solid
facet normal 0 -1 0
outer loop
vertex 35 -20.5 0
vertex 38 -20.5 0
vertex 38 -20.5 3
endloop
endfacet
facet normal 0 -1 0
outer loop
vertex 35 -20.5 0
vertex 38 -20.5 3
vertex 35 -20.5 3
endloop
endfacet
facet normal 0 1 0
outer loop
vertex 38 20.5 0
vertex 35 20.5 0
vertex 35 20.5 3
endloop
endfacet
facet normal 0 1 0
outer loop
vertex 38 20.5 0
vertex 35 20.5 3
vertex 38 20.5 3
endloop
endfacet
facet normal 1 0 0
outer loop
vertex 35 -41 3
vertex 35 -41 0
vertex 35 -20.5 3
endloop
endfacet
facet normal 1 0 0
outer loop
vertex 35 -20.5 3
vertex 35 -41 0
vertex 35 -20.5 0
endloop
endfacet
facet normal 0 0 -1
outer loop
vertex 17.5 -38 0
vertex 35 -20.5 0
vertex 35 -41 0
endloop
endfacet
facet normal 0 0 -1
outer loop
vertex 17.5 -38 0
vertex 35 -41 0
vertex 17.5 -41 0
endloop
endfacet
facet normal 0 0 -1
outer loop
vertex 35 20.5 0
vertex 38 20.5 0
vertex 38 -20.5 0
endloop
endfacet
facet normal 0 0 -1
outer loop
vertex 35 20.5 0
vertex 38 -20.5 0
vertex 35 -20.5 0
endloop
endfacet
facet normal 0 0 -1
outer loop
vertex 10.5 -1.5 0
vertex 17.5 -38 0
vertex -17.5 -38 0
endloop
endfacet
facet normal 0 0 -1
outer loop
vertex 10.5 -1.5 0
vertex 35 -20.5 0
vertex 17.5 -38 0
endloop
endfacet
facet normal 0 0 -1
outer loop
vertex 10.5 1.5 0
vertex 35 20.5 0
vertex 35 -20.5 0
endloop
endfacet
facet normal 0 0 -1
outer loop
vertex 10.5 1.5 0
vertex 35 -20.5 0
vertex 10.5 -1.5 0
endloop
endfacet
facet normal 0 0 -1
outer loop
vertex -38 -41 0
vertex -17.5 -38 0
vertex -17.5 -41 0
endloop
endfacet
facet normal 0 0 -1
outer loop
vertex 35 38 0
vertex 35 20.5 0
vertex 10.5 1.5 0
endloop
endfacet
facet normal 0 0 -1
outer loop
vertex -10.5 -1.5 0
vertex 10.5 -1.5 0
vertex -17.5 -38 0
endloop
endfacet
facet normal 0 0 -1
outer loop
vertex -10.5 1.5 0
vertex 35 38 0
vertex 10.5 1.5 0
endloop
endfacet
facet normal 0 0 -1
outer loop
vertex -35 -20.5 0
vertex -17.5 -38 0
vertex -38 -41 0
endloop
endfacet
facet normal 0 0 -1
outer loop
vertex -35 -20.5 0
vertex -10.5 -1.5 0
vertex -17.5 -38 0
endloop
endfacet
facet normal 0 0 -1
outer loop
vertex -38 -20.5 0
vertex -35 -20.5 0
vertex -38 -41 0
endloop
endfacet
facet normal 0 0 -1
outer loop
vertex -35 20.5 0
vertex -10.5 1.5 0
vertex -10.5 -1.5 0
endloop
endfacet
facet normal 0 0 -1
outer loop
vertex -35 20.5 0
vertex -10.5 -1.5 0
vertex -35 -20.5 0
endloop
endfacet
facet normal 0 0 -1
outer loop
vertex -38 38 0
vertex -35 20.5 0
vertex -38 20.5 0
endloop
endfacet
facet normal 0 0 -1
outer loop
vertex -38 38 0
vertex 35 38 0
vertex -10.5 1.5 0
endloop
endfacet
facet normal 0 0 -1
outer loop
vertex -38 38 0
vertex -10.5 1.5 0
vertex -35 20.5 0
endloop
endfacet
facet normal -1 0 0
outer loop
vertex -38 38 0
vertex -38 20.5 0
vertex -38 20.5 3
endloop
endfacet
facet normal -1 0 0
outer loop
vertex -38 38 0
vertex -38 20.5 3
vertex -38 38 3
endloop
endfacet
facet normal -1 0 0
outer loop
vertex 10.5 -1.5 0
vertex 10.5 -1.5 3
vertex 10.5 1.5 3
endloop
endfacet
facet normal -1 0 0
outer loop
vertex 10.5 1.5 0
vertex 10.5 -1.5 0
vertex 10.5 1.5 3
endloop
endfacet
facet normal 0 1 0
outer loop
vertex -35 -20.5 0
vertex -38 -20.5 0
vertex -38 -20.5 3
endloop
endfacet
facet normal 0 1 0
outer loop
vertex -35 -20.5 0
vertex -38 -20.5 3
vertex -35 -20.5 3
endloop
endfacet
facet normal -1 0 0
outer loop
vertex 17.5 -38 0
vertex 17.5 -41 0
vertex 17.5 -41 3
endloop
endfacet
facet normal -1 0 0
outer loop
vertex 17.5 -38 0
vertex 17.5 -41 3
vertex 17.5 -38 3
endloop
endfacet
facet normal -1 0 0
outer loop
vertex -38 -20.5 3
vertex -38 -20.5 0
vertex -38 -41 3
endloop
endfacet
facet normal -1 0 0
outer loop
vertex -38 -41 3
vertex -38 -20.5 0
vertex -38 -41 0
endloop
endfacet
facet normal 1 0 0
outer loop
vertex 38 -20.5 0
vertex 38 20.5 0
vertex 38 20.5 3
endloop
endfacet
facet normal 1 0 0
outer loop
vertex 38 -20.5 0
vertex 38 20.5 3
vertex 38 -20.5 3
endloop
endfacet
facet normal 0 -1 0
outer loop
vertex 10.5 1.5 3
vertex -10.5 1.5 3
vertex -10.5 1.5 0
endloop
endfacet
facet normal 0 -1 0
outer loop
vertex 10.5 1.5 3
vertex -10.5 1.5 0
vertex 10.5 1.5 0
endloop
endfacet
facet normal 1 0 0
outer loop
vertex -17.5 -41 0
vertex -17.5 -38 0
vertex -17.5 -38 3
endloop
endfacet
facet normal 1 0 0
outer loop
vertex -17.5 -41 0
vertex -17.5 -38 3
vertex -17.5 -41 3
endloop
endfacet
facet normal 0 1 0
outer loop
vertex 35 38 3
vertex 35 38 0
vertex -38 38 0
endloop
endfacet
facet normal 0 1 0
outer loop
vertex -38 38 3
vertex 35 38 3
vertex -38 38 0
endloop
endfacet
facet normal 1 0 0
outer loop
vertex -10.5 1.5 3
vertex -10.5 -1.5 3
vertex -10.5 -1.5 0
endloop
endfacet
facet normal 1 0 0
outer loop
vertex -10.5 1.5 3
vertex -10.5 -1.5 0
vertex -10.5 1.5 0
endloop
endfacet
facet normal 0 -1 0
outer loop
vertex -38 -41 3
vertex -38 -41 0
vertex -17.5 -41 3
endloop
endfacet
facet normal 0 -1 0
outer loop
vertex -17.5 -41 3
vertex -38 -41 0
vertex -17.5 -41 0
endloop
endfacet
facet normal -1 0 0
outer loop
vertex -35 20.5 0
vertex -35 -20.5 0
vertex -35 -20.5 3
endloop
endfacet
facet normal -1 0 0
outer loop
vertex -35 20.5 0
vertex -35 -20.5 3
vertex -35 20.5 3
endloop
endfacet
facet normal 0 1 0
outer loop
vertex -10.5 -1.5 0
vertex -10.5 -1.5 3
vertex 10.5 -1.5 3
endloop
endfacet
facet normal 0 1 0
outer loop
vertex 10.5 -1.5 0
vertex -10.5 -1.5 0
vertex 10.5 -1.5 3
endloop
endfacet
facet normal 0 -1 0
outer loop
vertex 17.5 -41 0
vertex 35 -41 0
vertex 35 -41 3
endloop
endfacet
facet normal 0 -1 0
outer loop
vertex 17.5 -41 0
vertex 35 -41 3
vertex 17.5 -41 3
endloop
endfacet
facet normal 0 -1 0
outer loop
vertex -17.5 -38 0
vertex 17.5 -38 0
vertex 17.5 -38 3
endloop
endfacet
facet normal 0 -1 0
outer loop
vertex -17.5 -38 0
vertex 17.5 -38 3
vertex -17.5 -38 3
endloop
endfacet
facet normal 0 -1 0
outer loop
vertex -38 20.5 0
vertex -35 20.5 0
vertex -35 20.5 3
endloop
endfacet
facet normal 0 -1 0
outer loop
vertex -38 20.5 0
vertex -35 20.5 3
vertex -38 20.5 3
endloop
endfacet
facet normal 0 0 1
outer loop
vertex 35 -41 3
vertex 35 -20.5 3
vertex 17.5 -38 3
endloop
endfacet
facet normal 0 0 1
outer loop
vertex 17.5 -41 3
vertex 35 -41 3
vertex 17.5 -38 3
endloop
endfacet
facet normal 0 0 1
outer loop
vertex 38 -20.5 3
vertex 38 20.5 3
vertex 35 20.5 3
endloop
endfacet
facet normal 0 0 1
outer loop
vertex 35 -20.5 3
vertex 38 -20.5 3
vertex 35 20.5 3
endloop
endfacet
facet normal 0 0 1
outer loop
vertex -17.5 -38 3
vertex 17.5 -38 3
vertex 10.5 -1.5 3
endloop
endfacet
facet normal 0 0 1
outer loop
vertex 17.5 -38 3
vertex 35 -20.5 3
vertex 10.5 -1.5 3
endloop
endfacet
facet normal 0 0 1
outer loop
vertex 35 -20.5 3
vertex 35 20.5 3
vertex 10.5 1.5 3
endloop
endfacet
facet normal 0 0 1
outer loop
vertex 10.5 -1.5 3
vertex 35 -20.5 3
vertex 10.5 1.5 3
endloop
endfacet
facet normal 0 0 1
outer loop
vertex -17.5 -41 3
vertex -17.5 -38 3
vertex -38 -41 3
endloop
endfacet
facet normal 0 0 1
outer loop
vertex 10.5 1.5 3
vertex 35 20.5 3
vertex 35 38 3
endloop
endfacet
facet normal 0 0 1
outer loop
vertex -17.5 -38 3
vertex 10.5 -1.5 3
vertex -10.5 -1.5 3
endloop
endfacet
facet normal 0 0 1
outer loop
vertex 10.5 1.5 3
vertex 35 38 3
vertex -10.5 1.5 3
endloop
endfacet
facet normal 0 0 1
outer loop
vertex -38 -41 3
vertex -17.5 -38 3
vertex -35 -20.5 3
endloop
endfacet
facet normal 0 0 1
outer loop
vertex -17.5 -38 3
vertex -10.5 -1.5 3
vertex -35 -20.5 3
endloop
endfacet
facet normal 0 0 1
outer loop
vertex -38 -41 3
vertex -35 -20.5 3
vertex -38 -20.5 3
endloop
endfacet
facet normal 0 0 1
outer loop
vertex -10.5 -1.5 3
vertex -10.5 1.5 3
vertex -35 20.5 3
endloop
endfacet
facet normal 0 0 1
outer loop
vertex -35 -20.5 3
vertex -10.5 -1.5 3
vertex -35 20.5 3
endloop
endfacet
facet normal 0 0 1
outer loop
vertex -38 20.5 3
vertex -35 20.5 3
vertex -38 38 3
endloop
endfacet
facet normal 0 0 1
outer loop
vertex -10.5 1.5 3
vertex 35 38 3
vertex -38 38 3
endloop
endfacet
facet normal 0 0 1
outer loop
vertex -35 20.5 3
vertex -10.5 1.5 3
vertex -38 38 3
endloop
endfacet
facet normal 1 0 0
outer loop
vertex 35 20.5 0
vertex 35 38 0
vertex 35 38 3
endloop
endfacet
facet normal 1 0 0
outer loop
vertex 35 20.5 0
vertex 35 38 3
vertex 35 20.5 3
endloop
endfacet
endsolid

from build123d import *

# Parameters (mm, degrees)
BOSS_EXTRUDE1_DEPTH = 3
SKETCH2_W           = 21
SKETCH2_H           = 3
CUT_EXTRUDE1_DEPTH  = 3


with BuildPart() as part:
    # Sketch1 → Boss-Extrude1 (new body)
    with BuildSketch(Plane.XY):
        Polygon((-35, 38), (-17.5, 38), (17.5, 38), (35, 38), (35, 20.5), (38, 20.5), (38, -20.5), (35, -20.5), (35, -38), (35, -41), (17.5, -41), (17.5, -38), (-17.5, -38), (-17.5, -41), (-35, -41), (-38, -41), (-38, -38), (-38, -20.5), (-35, -20.5), (-35, 20.5), (-38, 20.5), (-38, 38), align=None)
    extrude(amount=BOSS_EXTRUDE1_DEPTH)

    # Sketch2 → Cut-Extrude1 (cut)
    with BuildSketch(Plane.XY.offset(3)):
        Rectangle(SKETCH2_W, SKETCH2_H)
    extrude(amount=-CUT_EXTRUDE1_DEPTH, mode=Mode.SUBTRACT)


solid = part.part
